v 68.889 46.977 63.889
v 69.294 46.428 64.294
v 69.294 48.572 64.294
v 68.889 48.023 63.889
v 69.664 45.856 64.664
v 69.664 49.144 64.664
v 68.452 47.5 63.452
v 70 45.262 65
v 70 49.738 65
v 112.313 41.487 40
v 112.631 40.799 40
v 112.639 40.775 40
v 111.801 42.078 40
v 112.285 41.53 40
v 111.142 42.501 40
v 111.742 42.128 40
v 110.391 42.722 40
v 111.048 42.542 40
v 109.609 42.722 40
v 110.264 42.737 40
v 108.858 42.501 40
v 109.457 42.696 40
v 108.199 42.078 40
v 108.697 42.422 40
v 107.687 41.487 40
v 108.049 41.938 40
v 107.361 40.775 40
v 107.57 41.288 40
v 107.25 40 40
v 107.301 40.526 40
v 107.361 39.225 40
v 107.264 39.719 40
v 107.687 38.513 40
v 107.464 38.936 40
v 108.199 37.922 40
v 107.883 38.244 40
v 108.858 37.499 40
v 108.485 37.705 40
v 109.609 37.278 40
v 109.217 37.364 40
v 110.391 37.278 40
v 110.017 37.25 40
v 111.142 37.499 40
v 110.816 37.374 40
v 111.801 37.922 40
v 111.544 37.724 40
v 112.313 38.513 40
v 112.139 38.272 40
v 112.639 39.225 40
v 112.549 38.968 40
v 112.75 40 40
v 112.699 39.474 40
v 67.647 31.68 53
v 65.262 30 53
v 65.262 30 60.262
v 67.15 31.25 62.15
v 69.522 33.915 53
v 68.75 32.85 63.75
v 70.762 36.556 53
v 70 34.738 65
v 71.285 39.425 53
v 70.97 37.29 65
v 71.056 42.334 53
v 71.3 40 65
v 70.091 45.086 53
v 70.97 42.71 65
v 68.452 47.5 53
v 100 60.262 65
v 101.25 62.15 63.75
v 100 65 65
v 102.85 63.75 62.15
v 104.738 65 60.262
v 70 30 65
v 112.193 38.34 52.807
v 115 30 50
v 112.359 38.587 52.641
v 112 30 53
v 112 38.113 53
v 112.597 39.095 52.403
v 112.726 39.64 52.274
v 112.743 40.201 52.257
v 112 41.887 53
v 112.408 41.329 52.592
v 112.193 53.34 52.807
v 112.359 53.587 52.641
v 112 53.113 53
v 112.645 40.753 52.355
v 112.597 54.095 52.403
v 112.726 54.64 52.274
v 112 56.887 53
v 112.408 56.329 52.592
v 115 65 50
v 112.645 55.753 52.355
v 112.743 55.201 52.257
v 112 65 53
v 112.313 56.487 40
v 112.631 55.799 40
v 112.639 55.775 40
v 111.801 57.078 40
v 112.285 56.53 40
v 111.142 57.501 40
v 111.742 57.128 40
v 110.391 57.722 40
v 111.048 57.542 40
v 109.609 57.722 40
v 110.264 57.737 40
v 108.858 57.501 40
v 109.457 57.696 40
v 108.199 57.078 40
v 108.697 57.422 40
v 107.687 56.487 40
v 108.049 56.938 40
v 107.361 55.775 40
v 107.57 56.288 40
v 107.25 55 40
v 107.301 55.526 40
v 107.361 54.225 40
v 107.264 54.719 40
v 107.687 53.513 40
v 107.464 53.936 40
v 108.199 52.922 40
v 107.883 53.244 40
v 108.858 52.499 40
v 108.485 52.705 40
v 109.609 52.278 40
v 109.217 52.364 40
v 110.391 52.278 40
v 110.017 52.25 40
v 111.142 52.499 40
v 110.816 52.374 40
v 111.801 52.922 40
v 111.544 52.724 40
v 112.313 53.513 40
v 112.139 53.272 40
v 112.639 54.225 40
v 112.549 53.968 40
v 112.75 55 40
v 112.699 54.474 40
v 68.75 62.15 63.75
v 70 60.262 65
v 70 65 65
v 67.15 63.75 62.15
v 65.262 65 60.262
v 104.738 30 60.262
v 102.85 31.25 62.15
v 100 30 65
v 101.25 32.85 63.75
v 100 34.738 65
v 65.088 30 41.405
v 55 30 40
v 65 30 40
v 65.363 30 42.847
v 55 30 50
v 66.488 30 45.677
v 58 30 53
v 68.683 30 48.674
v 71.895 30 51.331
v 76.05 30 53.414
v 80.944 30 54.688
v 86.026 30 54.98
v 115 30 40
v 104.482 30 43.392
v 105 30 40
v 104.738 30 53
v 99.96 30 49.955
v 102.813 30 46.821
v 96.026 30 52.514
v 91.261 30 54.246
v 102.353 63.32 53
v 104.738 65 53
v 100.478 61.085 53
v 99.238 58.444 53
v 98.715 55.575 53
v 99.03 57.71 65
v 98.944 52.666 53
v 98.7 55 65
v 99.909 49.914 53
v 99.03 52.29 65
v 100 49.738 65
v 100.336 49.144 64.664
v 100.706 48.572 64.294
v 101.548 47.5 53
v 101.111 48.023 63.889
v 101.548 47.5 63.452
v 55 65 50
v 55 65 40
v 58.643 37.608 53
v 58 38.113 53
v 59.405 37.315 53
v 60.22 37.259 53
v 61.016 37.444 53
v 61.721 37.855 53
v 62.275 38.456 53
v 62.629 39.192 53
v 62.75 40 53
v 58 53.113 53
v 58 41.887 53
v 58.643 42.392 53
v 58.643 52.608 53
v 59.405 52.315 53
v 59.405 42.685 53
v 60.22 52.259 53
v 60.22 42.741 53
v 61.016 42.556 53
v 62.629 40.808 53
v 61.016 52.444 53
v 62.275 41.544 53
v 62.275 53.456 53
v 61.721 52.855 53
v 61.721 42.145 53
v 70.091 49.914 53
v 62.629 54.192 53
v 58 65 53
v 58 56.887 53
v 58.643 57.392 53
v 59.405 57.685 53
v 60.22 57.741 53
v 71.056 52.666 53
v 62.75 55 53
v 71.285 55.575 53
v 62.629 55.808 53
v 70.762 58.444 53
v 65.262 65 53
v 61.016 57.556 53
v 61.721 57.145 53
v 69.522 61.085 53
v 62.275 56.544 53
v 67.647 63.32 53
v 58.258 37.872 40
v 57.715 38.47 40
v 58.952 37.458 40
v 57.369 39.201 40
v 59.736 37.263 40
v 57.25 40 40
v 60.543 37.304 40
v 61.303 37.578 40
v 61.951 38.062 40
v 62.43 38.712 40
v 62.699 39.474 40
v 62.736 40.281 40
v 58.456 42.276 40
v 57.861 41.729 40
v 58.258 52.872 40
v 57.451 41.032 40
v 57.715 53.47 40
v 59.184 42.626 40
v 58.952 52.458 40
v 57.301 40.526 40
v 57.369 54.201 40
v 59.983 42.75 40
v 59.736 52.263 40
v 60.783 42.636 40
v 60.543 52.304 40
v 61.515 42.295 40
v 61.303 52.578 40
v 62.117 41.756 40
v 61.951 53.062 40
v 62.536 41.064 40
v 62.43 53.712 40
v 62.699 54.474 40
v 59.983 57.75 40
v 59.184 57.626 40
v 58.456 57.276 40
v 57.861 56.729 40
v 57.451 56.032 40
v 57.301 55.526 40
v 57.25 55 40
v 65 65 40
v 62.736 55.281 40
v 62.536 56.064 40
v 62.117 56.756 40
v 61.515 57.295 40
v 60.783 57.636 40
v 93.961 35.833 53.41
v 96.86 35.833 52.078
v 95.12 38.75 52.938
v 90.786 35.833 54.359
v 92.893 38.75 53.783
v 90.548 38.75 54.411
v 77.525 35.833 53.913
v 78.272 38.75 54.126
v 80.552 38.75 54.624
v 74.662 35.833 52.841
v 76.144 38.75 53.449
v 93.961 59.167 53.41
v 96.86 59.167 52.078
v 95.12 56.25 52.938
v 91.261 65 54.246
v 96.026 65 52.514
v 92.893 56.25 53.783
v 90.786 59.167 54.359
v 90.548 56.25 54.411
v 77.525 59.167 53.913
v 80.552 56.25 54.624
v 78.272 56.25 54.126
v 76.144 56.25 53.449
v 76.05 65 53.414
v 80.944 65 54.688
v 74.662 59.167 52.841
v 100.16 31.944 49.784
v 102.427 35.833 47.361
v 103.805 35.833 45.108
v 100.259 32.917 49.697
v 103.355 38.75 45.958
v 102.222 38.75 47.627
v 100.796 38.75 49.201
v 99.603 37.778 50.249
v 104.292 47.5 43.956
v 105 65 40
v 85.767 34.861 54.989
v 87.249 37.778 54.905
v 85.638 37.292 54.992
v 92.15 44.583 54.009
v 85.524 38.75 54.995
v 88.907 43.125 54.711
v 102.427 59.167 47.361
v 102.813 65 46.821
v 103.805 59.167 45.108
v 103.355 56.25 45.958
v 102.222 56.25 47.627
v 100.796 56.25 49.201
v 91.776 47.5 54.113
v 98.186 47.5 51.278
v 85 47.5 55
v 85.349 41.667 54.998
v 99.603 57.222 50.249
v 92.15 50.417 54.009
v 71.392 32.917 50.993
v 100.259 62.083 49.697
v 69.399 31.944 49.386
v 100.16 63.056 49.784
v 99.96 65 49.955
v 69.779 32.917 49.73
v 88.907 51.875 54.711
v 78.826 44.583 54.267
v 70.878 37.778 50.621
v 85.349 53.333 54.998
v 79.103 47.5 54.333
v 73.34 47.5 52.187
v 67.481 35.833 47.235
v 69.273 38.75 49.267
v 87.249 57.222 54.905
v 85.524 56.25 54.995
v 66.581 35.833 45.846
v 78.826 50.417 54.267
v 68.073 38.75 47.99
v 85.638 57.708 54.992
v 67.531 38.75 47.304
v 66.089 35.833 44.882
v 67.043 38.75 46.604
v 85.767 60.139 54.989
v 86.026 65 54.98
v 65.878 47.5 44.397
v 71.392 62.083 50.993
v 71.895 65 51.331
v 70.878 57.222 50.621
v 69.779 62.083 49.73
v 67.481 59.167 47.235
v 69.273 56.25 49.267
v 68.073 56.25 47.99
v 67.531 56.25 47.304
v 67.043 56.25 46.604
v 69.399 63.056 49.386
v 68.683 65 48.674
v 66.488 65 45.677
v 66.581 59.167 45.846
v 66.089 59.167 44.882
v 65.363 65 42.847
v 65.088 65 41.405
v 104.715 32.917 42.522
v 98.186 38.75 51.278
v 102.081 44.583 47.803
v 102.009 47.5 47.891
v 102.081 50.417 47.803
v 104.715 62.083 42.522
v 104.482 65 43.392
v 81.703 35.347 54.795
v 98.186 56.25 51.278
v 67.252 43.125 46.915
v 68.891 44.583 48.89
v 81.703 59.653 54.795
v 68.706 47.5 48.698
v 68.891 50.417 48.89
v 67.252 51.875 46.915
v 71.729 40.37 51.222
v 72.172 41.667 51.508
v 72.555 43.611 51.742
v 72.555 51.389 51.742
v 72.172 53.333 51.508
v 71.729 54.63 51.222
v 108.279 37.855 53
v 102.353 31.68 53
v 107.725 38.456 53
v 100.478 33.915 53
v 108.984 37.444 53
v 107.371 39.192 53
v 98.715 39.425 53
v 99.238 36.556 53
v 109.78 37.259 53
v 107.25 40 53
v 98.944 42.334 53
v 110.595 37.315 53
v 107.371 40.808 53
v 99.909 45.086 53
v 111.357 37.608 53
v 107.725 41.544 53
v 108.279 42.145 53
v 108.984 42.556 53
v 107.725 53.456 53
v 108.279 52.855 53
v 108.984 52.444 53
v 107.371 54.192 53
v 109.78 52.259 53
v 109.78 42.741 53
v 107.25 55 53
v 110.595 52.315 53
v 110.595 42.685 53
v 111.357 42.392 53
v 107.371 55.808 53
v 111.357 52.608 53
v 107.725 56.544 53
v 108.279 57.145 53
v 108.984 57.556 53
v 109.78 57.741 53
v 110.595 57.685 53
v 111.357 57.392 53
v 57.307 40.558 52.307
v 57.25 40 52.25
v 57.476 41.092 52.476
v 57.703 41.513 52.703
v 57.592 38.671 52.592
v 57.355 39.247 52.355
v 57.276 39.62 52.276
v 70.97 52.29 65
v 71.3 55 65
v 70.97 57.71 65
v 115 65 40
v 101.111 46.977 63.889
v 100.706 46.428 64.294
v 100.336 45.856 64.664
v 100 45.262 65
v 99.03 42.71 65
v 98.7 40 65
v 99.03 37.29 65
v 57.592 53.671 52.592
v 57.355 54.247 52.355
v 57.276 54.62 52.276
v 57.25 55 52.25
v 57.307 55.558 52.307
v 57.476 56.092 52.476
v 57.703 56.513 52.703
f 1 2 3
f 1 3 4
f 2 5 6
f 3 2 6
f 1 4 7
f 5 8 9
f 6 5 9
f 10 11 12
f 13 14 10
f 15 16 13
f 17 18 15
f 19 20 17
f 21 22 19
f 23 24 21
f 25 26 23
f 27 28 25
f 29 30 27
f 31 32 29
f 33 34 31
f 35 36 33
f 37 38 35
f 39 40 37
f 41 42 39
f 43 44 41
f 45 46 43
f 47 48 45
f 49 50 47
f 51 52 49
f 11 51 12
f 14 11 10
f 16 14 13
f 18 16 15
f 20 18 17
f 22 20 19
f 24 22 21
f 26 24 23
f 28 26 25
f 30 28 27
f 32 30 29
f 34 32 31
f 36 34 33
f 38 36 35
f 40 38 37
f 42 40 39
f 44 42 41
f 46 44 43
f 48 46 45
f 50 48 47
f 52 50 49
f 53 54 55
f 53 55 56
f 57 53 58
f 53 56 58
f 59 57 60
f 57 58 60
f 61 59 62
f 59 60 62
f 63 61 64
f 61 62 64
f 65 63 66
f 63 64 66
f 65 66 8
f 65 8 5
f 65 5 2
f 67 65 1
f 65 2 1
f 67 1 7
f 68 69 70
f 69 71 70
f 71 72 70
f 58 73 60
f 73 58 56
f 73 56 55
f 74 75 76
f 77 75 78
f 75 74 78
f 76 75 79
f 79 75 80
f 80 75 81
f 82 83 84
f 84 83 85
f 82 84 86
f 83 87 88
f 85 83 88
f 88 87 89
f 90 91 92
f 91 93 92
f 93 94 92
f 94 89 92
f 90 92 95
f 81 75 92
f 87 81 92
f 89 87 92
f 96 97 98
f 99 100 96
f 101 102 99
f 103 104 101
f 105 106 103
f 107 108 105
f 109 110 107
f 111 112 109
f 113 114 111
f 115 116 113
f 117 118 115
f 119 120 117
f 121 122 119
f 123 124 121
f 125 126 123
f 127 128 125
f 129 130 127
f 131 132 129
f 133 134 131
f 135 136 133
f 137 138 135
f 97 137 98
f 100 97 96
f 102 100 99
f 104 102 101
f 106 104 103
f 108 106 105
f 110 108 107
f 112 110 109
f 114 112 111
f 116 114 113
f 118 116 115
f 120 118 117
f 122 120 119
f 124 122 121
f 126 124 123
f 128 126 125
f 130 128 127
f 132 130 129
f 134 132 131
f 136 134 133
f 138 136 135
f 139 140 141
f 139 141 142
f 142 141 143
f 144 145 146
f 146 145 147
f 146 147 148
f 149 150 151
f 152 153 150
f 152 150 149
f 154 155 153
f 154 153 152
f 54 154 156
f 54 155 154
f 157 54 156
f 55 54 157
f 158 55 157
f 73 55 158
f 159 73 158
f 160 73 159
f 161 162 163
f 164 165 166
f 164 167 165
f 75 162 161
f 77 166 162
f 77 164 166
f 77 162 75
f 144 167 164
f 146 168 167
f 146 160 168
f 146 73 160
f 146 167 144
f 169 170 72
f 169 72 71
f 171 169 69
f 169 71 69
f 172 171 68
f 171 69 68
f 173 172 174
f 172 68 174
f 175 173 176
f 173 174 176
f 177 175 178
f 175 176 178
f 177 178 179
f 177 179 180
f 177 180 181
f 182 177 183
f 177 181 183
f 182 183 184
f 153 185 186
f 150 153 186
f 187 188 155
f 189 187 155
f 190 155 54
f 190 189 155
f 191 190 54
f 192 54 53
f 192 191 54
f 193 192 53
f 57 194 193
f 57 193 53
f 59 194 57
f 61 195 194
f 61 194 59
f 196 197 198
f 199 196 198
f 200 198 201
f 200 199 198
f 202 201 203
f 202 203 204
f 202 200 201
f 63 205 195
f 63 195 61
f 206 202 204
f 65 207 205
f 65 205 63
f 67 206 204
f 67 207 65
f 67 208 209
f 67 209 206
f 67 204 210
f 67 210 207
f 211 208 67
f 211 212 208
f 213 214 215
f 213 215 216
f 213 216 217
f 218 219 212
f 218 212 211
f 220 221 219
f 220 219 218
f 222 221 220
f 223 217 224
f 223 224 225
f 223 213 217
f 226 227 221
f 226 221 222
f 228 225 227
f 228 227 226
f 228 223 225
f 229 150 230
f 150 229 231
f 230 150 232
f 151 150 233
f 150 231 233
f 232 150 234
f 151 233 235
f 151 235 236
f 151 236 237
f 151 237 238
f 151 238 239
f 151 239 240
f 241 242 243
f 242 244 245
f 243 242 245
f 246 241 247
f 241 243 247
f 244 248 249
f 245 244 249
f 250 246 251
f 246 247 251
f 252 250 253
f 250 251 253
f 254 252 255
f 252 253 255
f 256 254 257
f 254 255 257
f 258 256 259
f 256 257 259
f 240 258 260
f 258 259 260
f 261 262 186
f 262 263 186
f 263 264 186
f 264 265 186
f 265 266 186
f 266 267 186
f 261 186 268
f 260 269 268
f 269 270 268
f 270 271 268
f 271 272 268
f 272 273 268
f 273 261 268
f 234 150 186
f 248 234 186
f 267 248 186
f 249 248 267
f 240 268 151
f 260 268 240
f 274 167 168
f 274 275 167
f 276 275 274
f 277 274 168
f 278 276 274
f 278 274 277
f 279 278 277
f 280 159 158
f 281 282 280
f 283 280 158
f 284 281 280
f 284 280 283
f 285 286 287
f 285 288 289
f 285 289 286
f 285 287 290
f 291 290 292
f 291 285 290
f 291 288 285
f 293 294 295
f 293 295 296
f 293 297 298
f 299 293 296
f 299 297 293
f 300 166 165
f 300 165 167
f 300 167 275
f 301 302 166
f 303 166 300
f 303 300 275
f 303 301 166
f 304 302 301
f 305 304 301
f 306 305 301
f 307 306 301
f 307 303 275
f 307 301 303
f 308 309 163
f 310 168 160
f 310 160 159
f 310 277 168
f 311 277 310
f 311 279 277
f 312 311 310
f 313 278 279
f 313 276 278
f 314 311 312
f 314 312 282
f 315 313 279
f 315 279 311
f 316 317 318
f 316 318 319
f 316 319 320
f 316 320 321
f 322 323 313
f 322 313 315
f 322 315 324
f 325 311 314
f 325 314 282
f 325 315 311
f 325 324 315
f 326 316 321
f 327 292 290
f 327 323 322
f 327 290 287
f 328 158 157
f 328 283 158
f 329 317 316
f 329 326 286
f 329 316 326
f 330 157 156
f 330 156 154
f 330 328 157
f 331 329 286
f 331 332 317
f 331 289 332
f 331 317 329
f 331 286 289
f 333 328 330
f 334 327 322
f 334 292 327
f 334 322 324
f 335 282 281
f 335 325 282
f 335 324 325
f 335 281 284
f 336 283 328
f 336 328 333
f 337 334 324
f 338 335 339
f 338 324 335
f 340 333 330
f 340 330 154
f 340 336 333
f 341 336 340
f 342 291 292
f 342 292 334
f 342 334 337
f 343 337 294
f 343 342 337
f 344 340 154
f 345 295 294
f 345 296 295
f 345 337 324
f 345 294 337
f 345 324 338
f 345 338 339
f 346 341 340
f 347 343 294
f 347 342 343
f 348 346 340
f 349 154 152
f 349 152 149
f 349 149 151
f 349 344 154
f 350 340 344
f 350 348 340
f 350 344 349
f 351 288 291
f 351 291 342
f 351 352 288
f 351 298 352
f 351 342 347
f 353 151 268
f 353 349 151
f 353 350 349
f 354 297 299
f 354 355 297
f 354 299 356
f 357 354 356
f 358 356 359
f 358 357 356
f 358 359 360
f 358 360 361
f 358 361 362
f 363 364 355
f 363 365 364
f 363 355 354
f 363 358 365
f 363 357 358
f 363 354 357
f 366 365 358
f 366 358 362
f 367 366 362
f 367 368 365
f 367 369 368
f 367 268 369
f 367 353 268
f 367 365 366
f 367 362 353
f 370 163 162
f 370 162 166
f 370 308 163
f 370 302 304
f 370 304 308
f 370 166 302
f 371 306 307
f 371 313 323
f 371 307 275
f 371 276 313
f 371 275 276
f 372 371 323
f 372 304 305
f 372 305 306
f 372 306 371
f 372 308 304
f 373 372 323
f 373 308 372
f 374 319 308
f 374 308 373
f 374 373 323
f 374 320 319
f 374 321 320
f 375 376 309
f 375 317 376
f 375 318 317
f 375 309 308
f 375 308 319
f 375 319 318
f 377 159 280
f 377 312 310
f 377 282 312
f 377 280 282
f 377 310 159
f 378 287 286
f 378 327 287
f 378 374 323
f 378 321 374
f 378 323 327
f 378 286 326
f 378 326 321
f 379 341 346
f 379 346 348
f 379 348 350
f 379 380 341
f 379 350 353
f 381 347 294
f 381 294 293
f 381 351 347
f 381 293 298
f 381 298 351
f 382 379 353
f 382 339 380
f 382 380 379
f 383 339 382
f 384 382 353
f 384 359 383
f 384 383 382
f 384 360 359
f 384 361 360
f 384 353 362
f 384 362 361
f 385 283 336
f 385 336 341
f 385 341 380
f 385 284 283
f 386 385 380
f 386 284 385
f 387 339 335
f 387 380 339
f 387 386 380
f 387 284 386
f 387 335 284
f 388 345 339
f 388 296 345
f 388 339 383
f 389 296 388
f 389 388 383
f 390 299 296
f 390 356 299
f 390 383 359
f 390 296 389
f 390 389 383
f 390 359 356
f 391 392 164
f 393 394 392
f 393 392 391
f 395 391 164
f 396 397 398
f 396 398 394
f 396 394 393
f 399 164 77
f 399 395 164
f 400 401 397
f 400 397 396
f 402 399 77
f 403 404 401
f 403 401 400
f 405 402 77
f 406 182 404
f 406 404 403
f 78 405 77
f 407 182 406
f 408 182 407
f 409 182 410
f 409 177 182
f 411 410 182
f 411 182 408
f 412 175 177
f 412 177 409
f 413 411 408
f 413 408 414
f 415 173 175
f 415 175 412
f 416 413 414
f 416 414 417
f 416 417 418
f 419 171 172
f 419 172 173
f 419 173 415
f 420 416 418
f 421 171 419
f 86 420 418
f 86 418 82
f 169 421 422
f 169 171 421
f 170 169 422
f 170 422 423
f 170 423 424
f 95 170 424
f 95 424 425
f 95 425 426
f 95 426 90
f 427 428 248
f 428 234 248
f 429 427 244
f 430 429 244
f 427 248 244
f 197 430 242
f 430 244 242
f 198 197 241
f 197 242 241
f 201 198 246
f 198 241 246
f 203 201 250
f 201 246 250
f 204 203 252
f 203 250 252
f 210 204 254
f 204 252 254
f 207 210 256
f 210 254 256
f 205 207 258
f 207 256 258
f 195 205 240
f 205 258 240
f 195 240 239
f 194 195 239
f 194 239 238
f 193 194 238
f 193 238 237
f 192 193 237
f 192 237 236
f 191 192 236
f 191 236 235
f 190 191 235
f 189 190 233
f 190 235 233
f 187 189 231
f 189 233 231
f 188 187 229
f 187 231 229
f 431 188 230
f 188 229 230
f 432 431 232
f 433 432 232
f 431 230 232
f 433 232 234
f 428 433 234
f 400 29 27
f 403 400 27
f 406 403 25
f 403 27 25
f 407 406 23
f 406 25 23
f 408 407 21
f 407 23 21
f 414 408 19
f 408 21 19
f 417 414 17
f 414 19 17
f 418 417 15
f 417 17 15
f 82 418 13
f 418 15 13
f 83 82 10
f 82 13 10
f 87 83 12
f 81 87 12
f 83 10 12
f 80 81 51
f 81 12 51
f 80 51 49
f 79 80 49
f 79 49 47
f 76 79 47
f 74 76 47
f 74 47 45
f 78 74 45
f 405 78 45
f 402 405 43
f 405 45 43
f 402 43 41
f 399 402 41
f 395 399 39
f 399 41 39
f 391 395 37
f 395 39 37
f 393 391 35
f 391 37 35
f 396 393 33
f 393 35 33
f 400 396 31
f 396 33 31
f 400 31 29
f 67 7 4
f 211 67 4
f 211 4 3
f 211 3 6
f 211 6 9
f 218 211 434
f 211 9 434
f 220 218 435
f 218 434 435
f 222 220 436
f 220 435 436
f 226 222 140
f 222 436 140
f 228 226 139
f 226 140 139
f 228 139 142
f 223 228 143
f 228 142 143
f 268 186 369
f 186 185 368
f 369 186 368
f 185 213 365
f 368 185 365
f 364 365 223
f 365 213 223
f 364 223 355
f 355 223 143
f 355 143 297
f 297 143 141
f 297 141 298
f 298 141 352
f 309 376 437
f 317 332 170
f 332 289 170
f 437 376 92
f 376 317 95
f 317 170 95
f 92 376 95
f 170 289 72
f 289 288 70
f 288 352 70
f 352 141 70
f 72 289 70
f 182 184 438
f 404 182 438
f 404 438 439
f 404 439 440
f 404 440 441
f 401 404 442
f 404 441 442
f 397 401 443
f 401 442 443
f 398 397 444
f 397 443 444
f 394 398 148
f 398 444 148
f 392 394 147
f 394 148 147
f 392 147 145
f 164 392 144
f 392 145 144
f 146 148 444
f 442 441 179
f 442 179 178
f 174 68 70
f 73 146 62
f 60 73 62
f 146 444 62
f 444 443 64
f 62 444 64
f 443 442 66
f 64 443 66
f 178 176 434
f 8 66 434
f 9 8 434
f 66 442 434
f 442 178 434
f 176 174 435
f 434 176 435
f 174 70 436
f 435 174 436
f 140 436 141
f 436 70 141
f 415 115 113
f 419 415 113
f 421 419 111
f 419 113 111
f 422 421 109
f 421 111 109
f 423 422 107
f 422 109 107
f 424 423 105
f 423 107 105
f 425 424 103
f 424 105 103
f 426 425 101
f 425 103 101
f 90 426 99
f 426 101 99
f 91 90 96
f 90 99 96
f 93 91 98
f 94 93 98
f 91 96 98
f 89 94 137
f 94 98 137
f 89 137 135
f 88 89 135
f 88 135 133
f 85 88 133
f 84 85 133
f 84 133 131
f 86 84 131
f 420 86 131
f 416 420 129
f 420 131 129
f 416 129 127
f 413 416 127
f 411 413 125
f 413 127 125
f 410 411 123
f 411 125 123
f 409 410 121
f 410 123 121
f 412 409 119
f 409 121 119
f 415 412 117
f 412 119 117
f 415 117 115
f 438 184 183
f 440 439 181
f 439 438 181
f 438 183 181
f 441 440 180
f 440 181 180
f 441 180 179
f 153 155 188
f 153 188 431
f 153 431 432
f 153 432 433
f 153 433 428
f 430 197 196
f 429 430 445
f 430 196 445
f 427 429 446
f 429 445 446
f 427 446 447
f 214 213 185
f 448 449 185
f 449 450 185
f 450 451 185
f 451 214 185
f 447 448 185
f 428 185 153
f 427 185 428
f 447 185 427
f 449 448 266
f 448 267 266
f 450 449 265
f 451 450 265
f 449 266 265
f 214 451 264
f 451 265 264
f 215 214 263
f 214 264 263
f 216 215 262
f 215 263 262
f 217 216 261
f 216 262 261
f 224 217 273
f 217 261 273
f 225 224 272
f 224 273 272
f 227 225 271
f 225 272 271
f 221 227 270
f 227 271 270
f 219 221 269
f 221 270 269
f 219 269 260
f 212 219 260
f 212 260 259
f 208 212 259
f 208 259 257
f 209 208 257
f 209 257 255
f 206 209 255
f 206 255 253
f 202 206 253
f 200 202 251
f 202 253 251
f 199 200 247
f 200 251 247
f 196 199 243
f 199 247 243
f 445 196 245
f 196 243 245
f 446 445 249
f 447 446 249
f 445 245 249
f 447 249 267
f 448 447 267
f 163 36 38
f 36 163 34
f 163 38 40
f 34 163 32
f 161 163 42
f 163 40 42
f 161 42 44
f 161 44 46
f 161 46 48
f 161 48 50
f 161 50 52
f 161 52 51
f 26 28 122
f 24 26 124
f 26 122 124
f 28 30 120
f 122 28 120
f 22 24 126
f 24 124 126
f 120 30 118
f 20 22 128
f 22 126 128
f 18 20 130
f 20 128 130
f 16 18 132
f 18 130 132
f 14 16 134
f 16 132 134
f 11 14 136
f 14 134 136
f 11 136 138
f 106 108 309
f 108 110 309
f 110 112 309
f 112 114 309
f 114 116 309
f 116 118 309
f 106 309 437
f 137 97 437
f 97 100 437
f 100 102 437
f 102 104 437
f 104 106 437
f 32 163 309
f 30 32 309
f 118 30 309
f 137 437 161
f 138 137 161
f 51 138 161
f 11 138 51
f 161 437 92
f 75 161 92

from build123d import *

# Parameters (mm, degrees)
PAD025_DEPTH        = 35
HOLE025_D           = 5.5
HOLE025_DEPTH       = 25
HOLE025_CBORE_D     = 22.6
HOLE025_CBORE_DEPTH = 12
HOLE025_TIPS_R      = 2.75
POCKET001_DEPTH     = 48


with BuildPart() as part:
    # Sketch054 → Pad025 (new body)
    with BuildSketch(Plane.XZ):
        with BuildLine():
            Line((50, -1e-05), (60, 0))
            Line((60, 0), (60, 25))
            Line((60, 25), (0, 25))
            Line((0, 25), (0, 0))
            Line((0, 0), (10, 5e-06))
            add(Edge.make_bspline(
                [(30, 15), (10.000006, 15), (10, 5e-06)],
                knots=[4.712389, 4.712389, 4.712389, 6.283185, 6.283185, 6.283185], degree=2, weights=[1, 0.707107, 1]))
            add(Edge.make_bspline(
                [(50, -1e-05), (50.000013, 15), (30, 15)],
                knots=[3.141592, 3.141592, 3.141592, 4.712389, 4.712389, 4.712389], degree=2, weights=[1, 0.707107, 1]))
        make_face()
    extrude(amount=PAD025_DEPTH)

    # Hole025
    with Locations(Plane.XY.offset(25)):
        with Locations((55, -25), (55, -10), (5, -25), (5, -10)):
            CounterBoreHole(HOLE025_D / 2, HOLE025_CBORE_D / 2, HOLE025_CBORE_DEPTH, depth=HOLE025_DEPTH)

    # Hole025 tips → Hole025 tip 1 section 0
    with BuildSketch(Plane.XY, mode=Mode.PRIVATE) as hole025_tip_1_s0:
        with Locations((55, -25)):
            Circle(HOLE025_TIPS_R)
    loft([hole025_tip_1_s0.sketch, Vertex(55, -25, -1.652367)], mode=Mode.SUBTRACT)

    # Hole025 tips → Hole025 tip 2 section 0
    with BuildSketch(Plane.XY, mode=Mode.PRIVATE) as hole025_tip_2_s0:
        with Locations((55, -10)):
            Circle(HOLE025_TIPS_R)
    loft([hole025_tip_2_s0.sketch, Vertex(55, -10, -1.652367)], mode=Mode.SUBTRACT)

    # Hole025 tips → Hole025 tip 3 section 0
    with BuildSketch(Plane.XY, mode=Mode.PRIVATE) as hole025_tip_3_s0:
        with Locations((5, -25)):
            Circle(HOLE025_TIPS_R)
    loft([hole025_tip_3_s0.sketch, Vertex(5, -25, -1.652367)], mode=Mode.SUBTRACT)

    # Hole025 tips → Hole025 tip 4 section 0
    with BuildSketch(Plane.XY, mode=Mode.PRIVATE) as hole025_tip_4_s0:
        with Locations((5, -10)):
            Circle(HOLE025_TIPS_R)
    loft([hole025_tip_4_s0.sketch, Vertex(5, -10, -1.652367)], mode=Mode.SUBTRACT)

    # Sketch056 → Pocket001 (cut)
    with BuildSketch(Plane.XZ):
        Polygon((60, 10), (40, 30), (60, 30), align=None)
        Polygon((20, 30), (0, 10), (0, 30), align=None)
    extrude(amount=POCKET001_DEPTH, mode=Mode.SUBTRACT)


with BuildPart() as part_1:
    # Body057 placement: moved
    add(part.part.moved(Location((55, 65, 40))))


solid = part_1.part
